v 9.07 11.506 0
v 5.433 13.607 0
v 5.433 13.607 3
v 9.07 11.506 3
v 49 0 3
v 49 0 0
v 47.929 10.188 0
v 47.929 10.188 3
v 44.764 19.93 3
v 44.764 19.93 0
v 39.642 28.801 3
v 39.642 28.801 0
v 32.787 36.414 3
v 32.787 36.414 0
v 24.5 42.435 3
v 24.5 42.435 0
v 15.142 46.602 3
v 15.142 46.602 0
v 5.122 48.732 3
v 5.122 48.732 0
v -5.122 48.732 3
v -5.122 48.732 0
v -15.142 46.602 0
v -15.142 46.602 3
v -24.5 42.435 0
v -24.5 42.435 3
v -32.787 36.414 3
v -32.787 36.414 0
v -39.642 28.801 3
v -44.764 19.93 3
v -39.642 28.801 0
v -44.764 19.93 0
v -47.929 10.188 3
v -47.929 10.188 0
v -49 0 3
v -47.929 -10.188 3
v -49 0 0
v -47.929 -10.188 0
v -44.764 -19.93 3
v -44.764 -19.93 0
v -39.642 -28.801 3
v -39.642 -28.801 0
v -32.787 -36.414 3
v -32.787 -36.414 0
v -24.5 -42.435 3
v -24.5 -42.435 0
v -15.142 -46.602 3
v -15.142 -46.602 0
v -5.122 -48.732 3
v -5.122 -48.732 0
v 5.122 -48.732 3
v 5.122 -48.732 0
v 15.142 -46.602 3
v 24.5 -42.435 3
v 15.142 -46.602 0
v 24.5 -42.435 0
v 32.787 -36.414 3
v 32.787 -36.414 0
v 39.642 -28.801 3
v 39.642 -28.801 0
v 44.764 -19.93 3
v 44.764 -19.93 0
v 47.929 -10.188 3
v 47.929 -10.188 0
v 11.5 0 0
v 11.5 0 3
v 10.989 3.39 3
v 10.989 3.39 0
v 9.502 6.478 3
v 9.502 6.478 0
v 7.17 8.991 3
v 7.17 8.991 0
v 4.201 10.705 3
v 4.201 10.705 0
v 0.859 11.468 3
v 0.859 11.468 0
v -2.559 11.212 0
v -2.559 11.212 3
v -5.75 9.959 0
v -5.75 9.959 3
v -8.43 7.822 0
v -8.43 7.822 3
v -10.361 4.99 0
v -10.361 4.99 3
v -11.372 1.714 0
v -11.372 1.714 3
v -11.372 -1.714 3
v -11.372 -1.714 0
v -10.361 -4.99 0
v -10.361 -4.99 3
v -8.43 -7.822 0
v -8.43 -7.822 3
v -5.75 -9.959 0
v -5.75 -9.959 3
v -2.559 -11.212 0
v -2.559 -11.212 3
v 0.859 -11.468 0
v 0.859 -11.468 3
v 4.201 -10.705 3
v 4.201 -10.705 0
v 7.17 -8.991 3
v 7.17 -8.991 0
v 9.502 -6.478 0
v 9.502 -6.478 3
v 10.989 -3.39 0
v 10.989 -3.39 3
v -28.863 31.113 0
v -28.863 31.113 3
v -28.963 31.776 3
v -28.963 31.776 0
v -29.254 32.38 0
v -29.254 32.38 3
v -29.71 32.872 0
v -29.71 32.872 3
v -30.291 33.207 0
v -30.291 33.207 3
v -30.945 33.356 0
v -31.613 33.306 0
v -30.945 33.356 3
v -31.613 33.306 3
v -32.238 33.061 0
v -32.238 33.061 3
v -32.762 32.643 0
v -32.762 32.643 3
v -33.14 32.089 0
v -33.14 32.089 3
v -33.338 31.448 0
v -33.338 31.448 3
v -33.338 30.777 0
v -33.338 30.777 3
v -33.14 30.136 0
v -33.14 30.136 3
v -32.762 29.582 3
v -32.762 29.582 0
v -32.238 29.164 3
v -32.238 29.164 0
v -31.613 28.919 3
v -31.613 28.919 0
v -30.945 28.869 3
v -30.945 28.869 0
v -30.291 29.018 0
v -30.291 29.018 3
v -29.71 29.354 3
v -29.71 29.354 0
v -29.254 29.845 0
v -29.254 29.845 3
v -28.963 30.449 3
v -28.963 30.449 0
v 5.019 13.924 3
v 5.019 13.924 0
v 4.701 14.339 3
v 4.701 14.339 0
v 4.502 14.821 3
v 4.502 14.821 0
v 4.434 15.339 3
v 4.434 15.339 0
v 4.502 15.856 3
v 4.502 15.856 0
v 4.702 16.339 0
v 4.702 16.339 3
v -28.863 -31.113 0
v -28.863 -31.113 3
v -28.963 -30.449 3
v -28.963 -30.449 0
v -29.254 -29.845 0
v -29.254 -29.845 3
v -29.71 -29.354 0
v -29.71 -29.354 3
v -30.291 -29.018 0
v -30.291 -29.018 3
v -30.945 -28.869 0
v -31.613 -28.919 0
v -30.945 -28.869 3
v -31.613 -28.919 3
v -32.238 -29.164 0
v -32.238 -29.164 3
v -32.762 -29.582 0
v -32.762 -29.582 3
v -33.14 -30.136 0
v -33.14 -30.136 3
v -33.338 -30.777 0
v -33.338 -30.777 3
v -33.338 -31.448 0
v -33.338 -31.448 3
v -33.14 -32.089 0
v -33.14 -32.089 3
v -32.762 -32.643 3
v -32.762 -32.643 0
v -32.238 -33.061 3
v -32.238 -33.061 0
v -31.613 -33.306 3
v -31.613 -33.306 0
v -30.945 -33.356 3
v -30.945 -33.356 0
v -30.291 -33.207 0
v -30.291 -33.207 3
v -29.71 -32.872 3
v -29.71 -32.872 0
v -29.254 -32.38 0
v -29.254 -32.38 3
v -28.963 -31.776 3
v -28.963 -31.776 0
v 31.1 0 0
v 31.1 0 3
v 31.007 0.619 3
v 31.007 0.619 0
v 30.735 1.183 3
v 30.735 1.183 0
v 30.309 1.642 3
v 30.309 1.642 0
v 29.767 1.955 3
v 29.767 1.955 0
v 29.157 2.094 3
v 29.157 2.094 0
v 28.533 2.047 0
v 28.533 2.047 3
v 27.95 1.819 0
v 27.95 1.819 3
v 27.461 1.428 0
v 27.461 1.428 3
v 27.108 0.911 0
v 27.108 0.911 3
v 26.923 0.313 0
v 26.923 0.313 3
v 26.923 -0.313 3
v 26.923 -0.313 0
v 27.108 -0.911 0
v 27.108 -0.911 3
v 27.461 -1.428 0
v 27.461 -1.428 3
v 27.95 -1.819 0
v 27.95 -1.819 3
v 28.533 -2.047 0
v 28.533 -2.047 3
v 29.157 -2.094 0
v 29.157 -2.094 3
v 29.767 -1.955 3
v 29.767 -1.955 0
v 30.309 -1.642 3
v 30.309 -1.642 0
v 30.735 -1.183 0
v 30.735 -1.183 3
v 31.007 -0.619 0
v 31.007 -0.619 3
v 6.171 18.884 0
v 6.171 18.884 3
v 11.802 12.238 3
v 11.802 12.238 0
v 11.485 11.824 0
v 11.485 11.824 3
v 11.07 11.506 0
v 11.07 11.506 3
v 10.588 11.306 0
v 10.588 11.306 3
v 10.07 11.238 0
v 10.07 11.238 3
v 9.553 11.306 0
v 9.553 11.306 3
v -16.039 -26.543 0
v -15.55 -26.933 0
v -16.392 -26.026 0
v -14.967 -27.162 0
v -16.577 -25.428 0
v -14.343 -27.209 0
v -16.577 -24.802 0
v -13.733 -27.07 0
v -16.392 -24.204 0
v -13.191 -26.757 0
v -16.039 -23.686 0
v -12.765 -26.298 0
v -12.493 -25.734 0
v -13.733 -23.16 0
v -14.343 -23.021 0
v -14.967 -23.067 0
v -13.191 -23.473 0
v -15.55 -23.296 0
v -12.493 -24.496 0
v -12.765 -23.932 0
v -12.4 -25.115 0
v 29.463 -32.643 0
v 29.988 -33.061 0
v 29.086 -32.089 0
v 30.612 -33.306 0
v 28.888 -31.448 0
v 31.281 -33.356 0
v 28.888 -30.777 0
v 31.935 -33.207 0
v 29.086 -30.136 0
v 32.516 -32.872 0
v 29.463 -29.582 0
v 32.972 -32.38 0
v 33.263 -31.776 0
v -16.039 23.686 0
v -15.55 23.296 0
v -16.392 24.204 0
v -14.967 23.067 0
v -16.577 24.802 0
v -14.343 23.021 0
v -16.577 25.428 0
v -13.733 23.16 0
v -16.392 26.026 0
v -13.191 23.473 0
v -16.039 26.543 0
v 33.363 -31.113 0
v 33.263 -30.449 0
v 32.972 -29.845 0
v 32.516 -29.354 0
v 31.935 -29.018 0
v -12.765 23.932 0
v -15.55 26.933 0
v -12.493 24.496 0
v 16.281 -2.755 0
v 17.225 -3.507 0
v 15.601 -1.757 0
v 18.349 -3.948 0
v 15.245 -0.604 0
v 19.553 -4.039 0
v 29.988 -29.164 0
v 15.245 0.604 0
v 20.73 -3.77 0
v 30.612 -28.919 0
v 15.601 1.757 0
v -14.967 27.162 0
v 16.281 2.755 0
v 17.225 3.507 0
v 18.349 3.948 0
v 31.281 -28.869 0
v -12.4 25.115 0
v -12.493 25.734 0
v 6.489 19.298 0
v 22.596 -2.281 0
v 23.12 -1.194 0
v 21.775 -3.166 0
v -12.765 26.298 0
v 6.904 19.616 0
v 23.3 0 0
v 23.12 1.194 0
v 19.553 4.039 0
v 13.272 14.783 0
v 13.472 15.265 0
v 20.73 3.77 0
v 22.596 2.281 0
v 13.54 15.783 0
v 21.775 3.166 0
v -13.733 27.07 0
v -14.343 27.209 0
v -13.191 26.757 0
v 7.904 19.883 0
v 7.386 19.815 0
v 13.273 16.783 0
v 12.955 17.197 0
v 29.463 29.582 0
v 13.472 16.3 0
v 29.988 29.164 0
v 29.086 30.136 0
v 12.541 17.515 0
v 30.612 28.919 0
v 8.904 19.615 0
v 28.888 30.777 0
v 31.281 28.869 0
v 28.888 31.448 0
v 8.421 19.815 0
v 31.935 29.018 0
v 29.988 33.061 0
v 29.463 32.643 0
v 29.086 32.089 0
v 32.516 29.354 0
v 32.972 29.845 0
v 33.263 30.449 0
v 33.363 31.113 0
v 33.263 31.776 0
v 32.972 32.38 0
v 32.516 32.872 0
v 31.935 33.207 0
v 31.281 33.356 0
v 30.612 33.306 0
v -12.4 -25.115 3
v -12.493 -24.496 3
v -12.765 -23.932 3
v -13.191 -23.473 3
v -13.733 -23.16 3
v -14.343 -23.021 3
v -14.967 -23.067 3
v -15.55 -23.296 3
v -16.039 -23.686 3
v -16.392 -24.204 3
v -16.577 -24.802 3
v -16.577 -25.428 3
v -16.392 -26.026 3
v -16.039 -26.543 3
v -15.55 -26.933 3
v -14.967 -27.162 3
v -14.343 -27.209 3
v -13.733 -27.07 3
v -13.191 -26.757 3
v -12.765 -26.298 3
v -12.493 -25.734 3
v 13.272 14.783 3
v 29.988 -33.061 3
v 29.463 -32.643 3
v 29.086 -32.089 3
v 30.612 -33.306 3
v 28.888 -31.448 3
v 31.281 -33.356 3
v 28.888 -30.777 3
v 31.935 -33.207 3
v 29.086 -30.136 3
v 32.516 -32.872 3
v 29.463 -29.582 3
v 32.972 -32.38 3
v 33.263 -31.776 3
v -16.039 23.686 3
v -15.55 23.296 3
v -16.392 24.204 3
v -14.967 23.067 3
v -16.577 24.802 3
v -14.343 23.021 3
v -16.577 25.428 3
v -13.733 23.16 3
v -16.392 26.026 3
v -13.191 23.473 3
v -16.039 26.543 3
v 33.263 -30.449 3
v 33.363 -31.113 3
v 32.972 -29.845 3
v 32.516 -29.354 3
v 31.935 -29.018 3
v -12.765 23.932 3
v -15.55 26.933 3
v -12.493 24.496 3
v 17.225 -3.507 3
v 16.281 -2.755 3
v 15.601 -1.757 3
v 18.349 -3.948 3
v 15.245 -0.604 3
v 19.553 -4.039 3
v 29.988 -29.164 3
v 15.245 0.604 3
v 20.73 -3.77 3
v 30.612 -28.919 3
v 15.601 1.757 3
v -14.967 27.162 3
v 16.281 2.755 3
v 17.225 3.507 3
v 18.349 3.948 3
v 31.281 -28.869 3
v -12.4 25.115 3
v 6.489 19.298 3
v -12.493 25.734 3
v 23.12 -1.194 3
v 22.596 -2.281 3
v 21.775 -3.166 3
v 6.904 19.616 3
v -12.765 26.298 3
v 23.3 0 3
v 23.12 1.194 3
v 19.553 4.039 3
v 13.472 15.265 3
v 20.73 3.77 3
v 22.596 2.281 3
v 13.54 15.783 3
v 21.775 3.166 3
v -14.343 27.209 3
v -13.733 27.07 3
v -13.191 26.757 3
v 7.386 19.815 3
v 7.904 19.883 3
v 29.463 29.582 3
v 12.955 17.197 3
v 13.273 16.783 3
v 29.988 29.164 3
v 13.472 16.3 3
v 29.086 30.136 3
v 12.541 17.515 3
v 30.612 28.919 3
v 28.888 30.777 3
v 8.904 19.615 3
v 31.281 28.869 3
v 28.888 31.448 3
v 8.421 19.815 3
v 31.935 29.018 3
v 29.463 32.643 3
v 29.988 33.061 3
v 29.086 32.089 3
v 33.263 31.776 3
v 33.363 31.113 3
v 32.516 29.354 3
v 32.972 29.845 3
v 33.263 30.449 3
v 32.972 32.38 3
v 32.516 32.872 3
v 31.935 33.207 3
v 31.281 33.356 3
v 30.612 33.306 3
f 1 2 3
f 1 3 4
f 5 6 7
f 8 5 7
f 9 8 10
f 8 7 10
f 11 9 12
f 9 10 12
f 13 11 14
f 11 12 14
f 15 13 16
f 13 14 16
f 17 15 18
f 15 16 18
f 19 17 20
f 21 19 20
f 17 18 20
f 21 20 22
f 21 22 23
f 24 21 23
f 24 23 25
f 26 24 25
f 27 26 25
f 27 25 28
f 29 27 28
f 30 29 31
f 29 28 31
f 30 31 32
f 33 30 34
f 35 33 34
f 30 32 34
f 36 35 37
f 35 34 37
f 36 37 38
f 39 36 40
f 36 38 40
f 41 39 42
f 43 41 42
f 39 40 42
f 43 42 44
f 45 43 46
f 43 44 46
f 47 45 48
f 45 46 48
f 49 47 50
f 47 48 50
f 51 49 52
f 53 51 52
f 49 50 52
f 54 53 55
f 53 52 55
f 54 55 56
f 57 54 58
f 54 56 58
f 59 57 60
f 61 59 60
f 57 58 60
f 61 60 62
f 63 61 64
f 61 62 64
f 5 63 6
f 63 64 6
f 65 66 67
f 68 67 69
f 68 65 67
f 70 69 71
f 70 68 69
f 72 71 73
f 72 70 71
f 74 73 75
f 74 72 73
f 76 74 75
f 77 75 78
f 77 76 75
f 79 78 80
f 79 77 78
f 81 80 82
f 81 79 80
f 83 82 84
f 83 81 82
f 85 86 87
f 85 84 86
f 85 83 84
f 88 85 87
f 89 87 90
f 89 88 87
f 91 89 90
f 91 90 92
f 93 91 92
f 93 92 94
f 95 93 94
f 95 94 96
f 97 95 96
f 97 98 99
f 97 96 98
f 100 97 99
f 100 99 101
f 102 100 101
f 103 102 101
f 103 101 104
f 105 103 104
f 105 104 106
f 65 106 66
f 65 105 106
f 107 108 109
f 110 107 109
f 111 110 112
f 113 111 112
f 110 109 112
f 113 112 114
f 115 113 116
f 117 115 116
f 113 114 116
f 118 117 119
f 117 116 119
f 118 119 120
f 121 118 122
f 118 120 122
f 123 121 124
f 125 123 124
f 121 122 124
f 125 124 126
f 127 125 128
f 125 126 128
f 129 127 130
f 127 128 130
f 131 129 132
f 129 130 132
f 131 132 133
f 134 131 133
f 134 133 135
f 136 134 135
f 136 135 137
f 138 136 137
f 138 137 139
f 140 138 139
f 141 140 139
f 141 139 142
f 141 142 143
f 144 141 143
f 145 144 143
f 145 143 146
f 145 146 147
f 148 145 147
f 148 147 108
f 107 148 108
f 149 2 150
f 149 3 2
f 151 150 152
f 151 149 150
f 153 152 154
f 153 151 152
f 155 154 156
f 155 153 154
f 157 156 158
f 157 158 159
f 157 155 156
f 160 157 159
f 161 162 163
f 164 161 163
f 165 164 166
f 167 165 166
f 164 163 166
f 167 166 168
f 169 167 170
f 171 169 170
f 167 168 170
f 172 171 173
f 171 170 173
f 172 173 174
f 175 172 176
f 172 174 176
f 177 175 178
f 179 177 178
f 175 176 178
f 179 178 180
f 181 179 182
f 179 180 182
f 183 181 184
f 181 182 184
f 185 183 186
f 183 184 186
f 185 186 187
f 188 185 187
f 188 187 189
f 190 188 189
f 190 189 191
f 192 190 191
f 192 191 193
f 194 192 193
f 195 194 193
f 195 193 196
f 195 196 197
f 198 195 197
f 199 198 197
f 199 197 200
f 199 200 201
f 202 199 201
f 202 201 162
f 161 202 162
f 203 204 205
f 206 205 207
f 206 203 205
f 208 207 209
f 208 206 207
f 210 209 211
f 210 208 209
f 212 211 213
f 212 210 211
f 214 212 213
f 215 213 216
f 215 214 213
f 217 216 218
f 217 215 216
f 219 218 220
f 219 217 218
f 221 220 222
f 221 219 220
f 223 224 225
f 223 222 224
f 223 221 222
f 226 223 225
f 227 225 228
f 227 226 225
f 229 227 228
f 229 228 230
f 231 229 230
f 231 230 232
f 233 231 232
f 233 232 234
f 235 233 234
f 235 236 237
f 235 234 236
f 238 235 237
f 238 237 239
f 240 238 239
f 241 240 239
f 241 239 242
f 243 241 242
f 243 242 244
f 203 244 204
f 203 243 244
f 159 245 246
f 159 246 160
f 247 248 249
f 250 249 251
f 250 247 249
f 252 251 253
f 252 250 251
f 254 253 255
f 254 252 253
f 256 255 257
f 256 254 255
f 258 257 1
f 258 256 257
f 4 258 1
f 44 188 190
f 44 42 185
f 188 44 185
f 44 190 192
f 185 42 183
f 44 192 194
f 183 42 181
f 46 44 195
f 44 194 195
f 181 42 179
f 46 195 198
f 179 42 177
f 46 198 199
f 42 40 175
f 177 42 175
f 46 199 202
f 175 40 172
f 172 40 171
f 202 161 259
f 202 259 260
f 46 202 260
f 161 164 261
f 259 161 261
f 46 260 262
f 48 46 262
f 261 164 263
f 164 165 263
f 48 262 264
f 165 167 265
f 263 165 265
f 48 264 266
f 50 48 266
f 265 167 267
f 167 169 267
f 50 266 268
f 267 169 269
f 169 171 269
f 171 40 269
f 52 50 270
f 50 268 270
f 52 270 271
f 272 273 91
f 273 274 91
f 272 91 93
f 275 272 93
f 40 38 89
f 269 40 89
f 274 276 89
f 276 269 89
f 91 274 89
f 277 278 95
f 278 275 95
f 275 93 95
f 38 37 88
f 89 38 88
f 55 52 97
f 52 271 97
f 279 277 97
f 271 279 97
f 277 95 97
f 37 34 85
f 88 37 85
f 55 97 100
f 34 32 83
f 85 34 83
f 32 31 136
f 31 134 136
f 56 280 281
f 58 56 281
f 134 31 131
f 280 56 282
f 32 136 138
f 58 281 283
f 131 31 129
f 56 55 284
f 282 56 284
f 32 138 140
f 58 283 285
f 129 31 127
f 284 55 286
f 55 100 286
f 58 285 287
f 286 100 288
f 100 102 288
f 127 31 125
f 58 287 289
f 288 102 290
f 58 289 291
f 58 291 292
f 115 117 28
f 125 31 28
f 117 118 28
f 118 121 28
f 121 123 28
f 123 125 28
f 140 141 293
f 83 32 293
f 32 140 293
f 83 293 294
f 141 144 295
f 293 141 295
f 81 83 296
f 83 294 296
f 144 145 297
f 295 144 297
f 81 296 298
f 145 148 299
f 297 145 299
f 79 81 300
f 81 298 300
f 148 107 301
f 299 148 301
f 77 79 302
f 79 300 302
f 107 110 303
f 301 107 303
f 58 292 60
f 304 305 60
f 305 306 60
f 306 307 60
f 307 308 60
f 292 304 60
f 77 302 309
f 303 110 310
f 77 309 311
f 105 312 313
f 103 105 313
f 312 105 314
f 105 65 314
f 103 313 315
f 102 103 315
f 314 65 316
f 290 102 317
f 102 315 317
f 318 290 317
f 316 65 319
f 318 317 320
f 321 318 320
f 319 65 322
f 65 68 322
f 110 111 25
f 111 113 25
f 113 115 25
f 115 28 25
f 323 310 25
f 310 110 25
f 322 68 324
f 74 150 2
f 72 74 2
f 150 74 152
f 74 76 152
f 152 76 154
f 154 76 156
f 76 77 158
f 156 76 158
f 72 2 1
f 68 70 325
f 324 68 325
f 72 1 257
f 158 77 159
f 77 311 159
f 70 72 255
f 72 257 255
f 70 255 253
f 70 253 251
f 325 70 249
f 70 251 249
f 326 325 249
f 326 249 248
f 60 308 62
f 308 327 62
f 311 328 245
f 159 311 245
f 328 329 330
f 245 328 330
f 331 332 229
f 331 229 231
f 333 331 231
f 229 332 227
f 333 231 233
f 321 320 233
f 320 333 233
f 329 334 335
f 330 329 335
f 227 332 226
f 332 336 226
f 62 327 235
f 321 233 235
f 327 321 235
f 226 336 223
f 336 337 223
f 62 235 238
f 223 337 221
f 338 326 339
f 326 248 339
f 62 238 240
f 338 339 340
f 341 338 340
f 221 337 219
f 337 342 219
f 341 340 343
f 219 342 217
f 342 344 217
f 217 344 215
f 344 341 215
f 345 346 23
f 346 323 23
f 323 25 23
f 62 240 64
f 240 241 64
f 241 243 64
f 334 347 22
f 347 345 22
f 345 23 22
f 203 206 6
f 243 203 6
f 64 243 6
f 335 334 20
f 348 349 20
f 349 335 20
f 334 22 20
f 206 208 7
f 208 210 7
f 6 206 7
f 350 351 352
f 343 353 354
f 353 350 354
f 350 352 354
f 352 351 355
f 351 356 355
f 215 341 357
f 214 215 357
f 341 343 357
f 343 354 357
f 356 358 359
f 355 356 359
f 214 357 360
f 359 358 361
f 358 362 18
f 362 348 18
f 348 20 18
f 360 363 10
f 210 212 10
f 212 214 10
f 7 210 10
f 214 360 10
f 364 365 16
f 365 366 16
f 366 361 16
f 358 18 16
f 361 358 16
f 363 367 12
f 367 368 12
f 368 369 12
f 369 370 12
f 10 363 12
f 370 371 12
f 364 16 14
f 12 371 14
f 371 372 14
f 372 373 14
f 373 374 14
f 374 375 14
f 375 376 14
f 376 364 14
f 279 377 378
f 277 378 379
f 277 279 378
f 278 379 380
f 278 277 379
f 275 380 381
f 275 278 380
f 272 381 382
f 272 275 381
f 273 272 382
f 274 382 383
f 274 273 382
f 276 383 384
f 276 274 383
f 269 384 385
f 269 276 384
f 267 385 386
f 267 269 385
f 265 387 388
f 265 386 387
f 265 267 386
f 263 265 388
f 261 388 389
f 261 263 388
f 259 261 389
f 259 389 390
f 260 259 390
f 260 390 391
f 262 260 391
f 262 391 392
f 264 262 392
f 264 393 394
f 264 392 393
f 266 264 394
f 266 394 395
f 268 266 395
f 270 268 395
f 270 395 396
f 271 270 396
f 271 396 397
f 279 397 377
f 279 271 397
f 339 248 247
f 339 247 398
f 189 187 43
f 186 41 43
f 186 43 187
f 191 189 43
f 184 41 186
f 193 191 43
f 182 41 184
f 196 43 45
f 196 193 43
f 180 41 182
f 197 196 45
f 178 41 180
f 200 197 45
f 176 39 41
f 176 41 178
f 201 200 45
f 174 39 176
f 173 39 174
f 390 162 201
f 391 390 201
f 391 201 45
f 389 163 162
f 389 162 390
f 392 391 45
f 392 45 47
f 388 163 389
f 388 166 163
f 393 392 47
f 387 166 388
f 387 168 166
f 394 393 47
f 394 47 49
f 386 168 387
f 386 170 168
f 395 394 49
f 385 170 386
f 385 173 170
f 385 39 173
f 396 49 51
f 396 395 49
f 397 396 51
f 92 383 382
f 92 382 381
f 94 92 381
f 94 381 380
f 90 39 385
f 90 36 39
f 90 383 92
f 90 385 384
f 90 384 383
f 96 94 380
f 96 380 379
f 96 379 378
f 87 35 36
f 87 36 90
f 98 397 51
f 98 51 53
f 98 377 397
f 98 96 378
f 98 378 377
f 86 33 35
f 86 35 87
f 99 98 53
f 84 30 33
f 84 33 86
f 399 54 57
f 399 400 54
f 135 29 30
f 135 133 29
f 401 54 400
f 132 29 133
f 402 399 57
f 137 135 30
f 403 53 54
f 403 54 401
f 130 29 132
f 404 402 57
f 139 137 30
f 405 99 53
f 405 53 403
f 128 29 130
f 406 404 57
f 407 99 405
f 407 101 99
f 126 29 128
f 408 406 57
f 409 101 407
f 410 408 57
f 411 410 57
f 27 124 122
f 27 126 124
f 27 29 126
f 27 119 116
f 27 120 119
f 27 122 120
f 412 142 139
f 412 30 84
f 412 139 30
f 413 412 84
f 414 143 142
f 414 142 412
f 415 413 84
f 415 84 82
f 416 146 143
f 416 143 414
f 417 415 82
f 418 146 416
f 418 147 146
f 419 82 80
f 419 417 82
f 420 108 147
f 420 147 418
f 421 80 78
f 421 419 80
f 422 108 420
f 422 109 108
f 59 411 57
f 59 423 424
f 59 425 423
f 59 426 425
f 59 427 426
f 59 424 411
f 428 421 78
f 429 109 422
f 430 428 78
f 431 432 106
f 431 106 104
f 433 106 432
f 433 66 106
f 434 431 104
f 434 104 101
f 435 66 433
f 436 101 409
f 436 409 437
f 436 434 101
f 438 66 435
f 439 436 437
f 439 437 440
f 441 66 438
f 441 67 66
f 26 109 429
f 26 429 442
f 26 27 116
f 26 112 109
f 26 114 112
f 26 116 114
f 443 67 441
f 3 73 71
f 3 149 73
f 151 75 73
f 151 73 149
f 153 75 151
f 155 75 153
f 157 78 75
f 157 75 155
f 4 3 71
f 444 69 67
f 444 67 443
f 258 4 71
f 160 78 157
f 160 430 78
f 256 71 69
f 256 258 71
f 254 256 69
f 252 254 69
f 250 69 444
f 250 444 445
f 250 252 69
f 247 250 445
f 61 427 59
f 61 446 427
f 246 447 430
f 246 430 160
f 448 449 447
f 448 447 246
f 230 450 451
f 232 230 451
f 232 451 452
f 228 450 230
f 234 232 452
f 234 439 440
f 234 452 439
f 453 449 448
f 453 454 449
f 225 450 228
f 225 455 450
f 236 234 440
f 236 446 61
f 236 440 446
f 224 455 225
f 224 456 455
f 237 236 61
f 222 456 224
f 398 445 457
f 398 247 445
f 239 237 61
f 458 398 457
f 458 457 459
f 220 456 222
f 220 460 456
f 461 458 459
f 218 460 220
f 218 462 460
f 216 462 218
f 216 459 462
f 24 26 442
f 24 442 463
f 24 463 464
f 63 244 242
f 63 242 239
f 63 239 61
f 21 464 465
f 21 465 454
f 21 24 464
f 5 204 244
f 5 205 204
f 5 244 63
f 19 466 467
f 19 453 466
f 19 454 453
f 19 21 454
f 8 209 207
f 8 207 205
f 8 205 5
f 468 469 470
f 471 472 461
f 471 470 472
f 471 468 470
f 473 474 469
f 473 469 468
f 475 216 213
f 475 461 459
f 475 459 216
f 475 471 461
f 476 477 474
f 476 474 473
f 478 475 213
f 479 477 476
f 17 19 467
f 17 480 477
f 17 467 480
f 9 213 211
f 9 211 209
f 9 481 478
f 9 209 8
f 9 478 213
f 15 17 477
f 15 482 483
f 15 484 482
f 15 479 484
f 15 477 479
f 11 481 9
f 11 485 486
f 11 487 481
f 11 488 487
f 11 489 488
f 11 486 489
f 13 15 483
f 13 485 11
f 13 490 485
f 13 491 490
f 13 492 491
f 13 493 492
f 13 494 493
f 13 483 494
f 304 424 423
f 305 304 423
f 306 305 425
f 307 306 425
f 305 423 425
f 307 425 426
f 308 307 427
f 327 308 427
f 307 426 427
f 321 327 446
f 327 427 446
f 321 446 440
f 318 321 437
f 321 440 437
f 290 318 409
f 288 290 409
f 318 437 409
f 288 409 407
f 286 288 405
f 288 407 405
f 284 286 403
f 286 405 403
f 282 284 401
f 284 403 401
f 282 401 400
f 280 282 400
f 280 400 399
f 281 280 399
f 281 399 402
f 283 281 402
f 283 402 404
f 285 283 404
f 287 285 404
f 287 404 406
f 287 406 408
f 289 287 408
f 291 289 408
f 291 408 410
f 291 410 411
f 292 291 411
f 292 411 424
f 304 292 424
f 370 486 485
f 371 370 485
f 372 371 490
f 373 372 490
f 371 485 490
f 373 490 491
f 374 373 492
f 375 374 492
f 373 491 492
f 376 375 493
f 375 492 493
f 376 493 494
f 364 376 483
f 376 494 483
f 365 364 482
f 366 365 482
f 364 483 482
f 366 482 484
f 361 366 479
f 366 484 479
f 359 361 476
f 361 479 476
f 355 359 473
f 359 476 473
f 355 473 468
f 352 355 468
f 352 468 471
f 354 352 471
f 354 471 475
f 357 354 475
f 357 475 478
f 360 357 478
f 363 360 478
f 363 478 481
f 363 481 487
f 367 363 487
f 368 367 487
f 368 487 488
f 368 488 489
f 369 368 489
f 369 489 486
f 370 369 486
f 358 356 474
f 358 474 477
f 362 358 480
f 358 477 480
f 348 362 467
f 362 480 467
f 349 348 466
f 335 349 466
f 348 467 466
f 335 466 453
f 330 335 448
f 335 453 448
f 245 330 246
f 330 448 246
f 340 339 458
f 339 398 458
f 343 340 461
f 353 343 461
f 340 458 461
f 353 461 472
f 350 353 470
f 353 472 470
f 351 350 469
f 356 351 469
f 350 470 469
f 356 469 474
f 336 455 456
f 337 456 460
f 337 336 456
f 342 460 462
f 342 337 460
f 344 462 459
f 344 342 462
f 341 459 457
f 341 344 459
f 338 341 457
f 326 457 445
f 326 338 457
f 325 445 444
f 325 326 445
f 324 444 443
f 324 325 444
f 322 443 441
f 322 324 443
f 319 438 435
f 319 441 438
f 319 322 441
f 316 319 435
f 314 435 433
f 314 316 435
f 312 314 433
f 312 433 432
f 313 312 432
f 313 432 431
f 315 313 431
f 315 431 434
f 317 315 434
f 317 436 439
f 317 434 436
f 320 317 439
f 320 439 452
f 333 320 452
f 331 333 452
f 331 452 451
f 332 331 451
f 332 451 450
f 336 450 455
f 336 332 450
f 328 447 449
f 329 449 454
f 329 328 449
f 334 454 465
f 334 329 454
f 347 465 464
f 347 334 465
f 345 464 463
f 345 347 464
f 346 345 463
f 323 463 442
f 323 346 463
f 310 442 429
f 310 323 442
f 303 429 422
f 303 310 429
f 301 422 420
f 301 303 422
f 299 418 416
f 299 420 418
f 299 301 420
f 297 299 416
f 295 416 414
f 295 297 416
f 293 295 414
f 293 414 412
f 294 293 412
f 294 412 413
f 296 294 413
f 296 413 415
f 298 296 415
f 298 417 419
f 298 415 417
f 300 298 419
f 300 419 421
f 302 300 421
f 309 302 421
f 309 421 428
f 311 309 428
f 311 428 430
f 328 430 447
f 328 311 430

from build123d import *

# Parameters (mm, degrees)
SKETCH_1_R          = 1.6
EXTRUDE_4_DEPTH     = 13
EXTRUDE_4_2_DEPTH   = 13
EXTRUDE_4_3_DEPTH   = 13
EXTRUDE_4_4_DEPTH   = 13
SKETCH_1_R_2        = 2.1
EXTRUDE_4_5_DEPTH   = 13
EXTRUDE_4_6_DEPTH   = 13
EXTRUDE_4_7_DEPTH   = 13
SKETCH_8_R          = 49
EXTRUDE_5_DEPTH     = 3
SKETCH_9_R          = 2.1
CUT_EXTRUDE_2_DEPTH = 13
SKETCH_3_R          = 8.6
CUT_EXTRUDE_3_DEPTH = 13
SKETCH_6_R          = 4.05
CUT_EXTRUDE_4_DEPTH = 13
CUT_EXTRUDE_5_DEPTH = 13
SKETCH_2_R          = 11.5
CUT_EXTRUDE_6_DEPTH = 13
FILLET_1_R          = 2
CUT_EXTRUDE_7_REACH = 71.361
SKETCH_10_R         = 2.25
EXTRUDE_START       = -3
SKETCH_11_R         = 2.1
EXTRUDE_6_DEPTH     = 3


with BuildPart() as part:
    # 草图1 → 凸台-拉伸4 (new body)
    with BuildSketch(Plane.XY):
        with Locations((0, 44)):
            Circle(SKETCH_1_R)
    extrude(amount=EXTRUDE_4_DEPTH)



with BuildPart() as body_2:
    # 草图1 → Extrude 4 2 (new body)
    with BuildSketch(Plane.XY):
        with Locations((44, 0)):
            Circle(SKETCH_1_R)
    extrude(amount=EXTRUDE_4_2_DEPTH)


with BuildPart() as body_3:
    # 草图1 → Extrude 4 3 (new body)
    with BuildSketch(Plane.XY):
        with Locations((0, -44)):
            Circle(SKETCH_1_R)
    extrude(amount=EXTRUDE_4_3_DEPTH)


with BuildPart() as body_4:
    # 草图1 → Extrude 4 4 (new body)
    with BuildSketch(Plane.XY):
        with Locations((-44, 0)):
            Circle(SKETCH_1_R)
    extrude(amount=EXTRUDE_4_4_DEPTH)


with BuildPart() as body_5:
    # 草图1 → Extrude 4 5 (new body)
    with BuildSketch(Plane.XY):
        with Locations((29, 0)):
            Circle(SKETCH_1_R_2)
    extrude(amount=EXTRUDE_4_5_DEPTH)


with BuildPart() as body_6:
    # 草图1 → Extrude 4 6 (new body)
    with BuildSketch(Plane.XY):
        with Locations((-14.5, 25.11473671)):
            Circle(SKETCH_1_R_2)
    extrude(amount=EXTRUDE_4_6_DEPTH)


with BuildPart() as body_7:
    # 草图1 → Extrude 4 7 (new body)
    with BuildSketch(Plane.XY):
        with Locations((-14.5, -25.11473671)):
            Circle(SKETCH_1_R_2)
    extrude(amount=EXTRUDE_4_7_DEPTH)


with BuildPart() as part_1:
    add(part.part)

    add(body_2.part)  # 凸台-拉伸5 merges body 2

    add(body_3.part)  # 凸台-拉伸5 merges body 3

    add(body_4.part)  # 凸台-拉伸5 merges body 4

    add(body_5.part)  # 凸台-拉伸5 merges body 5

    add(body_6.part)  # 凸台-拉伸5 merges body 6

    add(body_7.part)  # 凸台-拉伸5 merges body 7
    # 草图8 → 凸台-拉伸5 (add)
    with BuildSketch(Plane.XY):
        Circle(SKETCH_8_R)
    extrude(amount=EXTRUDE_5_DEPTH)

    # 草图9 → 切除-拉伸2 (cut)
    with BuildSketch(Plane.XY):
        with Locations((0, 44)):
            Circle(SKETCH_9_R)
        with Locations((44, 0)):
            Circle(SKETCH_9_R)
        with Locations((0, -44)):
            Circle(SKETCH_9_R)
        with Locations((-44, 0)):
            Circle(SKETCH_9_R)
        with Locations((-14.5, 25.11473671)):
            Circle(SKETCH_9_R)
        with Locations((-14.5, -25.11473671)):
            Circle(SKETCH_9_R)
        with Locations((29, 0)):
            Circle(SKETCH_9_R)
    extrude(amount=CUT_EXTRUDE_2_DEPTH, mode=Mode.SUBTRACT)

    # 草图3 → 切除-拉伸3 (cut)
    with BuildSketch(Plane.XY):
        Circle(SKETCH_3_R)
    extrude(amount=CUT_EXTRUDE_3_DEPTH, mode=Mode.SUBTRACT)

    # 草图6 → 切除-拉伸4 (cut)
    with BuildSketch(Plane.XY):
        with Locations((19.25, 0)):
            Circle(SKETCH_6_R)
    extrude(amount=CUT_EXTRUDE_4_DEPTH, mode=Mode.SUBTRACT)

    # 草图7 → 切除-拉伸5 (cut)
    with BuildSketch(Plane.XY):
        Polygon((10.802199699, 10.505830841), (14.272482459, 16.5145615), (7.171657827, 20.615572296), (3.701375067, 14.606841637), align=None)
    extrude(amount=CUT_EXTRUDE_5_DEPTH, mode=Mode.SUBTRACT)

    # 草图2 → 切除-拉伸6 (cut)
    with BuildSketch(Plane.XY):
        Circle(SKETCH_2_R)
    extrude(amount=CUT_EXTRUDE_6_DEPTH, mode=Mode.SUBTRACT)

    # 圆角1
    fillet_1_edges = [part_1.edges().sort_by_distance(p)[0] for p in [
        (7.171657827, 20.615572296, 1.5),
        (3.701375067, 14.606841637, 1.5),
        (10.802199699, 10.505830841, 1.5),
        (14.272482459, 16.5145615, 1.5),
    ]]
    fillet(fillet_1_edges, radius=FILLET_1_R)

    # 草图10 → 切除-拉伸7 (cut, up to next)
    with BuildSketch(Plane.XY.offset(3), mode=Mode.PRIVATE) as cut_extrude_7_sk1:
        with Locations((-31.112698372, 31.112698372)):
            Circle(SKETCH_10_R)
    cut_extrude_7_tool1 = extrude(cut_extrude_7_sk1.sketch, amount=-CUT_EXTRUDE_7_REACH, mode=Mode.PRIVATE) & part_1.part
    # 草图10 → 切除-拉伸7 (cut, up to next)
    with BuildSketch(Plane.XY.offset(3), mode=Mode.PRIVATE) as cut_extrude_7_sk2:
        with Locations((31.112698372, 31.112698372)):
            Circle(SKETCH_10_R)
    cut_extrude_7_tool2 = extrude(cut_extrude_7_sk2.sketch, amount=-CUT_EXTRUDE_7_REACH, mode=Mode.PRIVATE) & part_1.part
    # 草图10 → 切除-拉伸7 (cut, up to next)
    with BuildSketch(Plane.XY.offset(3), mode=Mode.PRIVATE) as cut_extrude_7_sk3:
        with Locations((31.112698372, -31.112698372)):
            Circle(SKETCH_10_R)
    cut_extrude_7_tool3 = extrude(cut_extrude_7_sk3.sketch, amount=-CUT_EXTRUDE_7_REACH, mode=Mode.PRIVATE) & part_1.part
    # 草图10 → 切除-拉伸7 (cut, up to next)
    with BuildSketch(Plane.XY.offset(3), mode=Mode.PRIVATE) as cut_extrude_7_sk4:
        with Locations((-31.112698372, -31.112698372)):
            Circle(SKETCH_10_R)
    cut_extrude_7_tool4 = extrude(cut_extrude_7_sk4.sketch, amount=-CUT_EXTRUDE_7_REACH, mode=Mode.PRIVATE) & part_1.part
    add(cut_extrude_7_tool1.solids().sort_by_distance((-31.112698, 31.112698, 3))[0], mode=Mode.SUBTRACT)
    add(cut_extrude_7_tool2.solids().sort_by_distance((31.112698, 31.112698, 3))[0], mode=Mode.SUBTRACT)
    add(cut_extrude_7_tool3.solids().sort_by_distance((31.112698, -31.112698, 3))[0], mode=Mode.SUBTRACT)
    add(cut_extrude_7_tool4.solids().sort_by_distance((-31.112698, -31.112698, 3))[0], mode=Mode.SUBTRACT)

    # 草图11 → 凸台-拉伸6 (add)
    with BuildSketch(Plane.XY.offset(3).offset(EXTRUDE_START)):
        with Locations((-44, 0)):
            Circle(SKETCH_11_R)
        with Locations((0, -44)):
            Circle(SKETCH_11_R)
        with Locations((44, 0)):
            Circle(SKETCH_11_R)
        with Locations((0, 44)):
            Circle(SKETCH_11_R)
    extrude(amount=EXTRUDE_6_DEPTH)


solid = part_1.part
